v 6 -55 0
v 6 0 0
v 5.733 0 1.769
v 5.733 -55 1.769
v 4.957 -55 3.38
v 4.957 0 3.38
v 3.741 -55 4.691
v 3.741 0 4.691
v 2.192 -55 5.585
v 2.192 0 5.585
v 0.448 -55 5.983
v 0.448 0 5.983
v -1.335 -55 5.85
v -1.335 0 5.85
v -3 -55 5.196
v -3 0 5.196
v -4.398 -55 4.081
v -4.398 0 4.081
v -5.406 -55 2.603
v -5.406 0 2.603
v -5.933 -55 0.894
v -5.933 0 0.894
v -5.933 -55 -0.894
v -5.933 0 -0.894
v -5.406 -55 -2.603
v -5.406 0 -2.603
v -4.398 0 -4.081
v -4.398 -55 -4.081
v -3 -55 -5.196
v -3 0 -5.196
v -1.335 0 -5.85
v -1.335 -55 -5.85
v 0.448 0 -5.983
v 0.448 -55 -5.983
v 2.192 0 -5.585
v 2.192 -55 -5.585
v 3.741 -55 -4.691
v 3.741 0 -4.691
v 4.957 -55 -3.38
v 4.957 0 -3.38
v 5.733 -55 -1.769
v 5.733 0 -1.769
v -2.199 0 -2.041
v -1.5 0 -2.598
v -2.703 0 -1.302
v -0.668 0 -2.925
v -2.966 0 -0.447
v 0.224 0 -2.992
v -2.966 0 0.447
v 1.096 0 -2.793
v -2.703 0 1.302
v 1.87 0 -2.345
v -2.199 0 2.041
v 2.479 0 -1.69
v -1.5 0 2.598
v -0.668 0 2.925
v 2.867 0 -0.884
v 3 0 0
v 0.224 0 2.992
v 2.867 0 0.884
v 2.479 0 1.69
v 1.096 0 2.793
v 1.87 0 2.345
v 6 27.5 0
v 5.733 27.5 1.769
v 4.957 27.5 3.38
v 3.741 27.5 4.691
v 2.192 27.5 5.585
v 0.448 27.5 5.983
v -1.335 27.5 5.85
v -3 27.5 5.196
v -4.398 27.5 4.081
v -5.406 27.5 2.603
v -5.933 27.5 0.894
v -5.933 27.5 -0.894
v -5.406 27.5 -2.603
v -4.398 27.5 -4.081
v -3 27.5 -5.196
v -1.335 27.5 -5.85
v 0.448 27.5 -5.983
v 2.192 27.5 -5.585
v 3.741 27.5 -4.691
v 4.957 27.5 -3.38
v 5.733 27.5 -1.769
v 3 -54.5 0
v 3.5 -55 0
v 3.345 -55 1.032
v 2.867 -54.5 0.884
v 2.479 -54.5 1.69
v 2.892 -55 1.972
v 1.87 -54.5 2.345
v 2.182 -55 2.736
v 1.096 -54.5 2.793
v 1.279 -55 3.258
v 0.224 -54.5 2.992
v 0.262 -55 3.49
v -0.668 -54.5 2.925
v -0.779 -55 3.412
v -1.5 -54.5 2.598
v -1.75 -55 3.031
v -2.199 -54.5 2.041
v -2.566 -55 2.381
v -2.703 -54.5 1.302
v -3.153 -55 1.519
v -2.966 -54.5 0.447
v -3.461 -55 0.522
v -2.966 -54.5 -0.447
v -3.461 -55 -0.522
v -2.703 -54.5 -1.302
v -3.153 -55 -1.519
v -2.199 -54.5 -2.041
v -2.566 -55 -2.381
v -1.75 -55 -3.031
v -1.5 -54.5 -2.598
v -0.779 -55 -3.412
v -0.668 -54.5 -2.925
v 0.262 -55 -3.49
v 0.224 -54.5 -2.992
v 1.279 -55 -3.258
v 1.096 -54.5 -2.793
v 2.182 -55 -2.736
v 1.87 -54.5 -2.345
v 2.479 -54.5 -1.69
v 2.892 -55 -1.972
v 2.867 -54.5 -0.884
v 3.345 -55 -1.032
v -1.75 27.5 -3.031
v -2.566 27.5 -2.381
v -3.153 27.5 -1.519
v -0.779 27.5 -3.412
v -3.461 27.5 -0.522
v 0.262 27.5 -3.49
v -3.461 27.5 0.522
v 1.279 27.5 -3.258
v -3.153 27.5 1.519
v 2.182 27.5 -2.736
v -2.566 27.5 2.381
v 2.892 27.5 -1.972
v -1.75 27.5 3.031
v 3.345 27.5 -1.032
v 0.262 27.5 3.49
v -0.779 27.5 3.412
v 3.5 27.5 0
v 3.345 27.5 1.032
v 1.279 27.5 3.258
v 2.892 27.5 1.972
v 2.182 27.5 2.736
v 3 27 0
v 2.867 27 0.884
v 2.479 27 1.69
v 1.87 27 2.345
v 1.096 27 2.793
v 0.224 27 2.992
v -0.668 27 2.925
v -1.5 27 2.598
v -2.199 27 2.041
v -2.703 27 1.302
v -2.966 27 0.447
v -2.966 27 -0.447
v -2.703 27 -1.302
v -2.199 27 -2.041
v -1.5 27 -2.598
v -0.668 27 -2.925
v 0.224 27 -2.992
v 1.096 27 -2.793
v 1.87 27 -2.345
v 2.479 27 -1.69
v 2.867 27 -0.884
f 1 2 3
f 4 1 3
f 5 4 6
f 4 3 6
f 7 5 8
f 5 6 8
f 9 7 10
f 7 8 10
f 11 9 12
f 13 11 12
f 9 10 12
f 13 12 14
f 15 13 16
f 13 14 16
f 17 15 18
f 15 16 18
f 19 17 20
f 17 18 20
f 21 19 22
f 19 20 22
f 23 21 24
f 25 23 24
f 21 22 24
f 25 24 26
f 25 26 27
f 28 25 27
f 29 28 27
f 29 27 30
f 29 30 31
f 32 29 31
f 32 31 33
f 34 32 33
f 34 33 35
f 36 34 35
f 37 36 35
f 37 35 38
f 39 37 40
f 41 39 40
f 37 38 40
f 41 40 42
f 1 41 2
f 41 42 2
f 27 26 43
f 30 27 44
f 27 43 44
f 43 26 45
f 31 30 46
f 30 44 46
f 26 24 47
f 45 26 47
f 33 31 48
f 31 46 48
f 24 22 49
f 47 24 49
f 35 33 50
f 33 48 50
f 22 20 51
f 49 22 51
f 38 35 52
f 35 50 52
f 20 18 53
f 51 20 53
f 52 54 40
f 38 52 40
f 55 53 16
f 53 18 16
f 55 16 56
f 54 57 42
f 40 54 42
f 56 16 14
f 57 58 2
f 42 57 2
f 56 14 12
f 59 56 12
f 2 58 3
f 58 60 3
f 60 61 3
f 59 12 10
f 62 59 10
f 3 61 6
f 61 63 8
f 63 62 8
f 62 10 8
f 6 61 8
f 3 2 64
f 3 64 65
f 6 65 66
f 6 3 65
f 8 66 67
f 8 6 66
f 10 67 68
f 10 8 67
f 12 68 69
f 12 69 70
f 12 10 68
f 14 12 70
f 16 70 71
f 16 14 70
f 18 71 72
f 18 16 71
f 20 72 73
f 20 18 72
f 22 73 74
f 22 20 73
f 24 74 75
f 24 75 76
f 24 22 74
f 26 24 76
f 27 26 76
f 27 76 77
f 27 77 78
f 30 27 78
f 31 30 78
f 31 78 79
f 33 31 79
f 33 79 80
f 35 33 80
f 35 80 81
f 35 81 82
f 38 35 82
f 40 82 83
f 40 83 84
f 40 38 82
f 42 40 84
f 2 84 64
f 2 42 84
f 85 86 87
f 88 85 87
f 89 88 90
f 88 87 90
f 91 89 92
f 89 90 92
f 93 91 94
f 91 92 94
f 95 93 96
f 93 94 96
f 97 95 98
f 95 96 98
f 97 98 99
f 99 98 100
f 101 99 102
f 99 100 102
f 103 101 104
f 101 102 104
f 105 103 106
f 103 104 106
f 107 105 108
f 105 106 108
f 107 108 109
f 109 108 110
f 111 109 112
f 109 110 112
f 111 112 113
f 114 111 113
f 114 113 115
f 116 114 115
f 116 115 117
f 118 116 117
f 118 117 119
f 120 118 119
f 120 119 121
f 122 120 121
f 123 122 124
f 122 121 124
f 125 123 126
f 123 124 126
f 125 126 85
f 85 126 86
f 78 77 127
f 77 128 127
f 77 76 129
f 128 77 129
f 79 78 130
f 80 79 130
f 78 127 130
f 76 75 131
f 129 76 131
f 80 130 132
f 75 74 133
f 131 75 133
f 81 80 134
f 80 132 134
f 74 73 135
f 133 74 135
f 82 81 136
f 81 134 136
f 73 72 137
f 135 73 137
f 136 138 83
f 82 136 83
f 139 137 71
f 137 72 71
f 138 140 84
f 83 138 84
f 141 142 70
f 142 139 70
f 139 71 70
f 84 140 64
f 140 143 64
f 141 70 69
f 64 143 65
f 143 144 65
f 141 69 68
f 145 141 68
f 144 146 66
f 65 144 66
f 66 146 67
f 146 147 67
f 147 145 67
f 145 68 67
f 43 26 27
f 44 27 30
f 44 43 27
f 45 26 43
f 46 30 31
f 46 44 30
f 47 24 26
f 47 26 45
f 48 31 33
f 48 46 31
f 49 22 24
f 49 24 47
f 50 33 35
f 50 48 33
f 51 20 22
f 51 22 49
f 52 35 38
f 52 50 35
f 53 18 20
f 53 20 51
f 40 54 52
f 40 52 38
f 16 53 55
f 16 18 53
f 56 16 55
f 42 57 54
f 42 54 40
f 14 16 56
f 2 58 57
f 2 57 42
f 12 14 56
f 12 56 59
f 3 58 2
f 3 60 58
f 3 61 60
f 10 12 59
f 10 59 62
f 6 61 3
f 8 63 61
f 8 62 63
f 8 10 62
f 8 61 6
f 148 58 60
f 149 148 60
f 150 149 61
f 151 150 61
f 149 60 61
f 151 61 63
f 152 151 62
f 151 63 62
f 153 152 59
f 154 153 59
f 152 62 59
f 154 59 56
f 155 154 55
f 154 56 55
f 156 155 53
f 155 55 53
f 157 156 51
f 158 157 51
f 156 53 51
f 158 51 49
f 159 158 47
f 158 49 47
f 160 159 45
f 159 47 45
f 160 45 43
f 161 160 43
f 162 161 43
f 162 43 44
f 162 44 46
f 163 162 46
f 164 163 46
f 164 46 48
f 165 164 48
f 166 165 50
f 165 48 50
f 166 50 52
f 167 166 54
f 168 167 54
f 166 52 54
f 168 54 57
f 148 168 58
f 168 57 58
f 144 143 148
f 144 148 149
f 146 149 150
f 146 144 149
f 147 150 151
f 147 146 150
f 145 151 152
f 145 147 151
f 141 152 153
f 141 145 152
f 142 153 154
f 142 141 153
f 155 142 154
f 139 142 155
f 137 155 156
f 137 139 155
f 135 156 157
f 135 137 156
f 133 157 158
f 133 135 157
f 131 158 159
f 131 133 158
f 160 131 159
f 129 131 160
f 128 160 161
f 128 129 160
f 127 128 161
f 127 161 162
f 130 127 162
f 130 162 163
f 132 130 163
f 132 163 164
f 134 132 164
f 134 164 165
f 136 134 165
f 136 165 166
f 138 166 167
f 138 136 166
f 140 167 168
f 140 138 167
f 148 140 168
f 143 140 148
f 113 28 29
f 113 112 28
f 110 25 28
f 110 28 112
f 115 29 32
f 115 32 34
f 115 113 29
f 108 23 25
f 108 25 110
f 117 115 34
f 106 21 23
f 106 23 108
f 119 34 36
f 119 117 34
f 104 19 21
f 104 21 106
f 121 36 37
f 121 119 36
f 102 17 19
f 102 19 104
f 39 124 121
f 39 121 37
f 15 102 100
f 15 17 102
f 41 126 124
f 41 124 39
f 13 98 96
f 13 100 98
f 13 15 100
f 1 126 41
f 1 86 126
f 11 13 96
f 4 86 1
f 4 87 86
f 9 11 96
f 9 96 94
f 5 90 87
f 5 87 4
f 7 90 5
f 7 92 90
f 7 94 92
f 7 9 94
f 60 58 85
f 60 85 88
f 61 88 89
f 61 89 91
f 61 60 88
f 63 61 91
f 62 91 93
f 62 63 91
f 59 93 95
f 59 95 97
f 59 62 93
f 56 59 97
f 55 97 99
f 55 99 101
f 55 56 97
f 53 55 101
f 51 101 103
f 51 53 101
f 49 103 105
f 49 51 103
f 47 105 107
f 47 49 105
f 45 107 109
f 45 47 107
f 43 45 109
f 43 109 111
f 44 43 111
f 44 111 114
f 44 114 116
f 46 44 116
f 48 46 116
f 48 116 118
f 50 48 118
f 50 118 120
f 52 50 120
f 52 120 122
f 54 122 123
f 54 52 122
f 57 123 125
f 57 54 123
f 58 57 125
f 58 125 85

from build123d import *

# Parameters (mm, degrees)
F0_R     = 6
F0_R_2   = 3
F1_DEPTH = 55
F2_SIZE  = 0.5
F3_DEPTH = 27.5
F4_SIZE  = 0.5


with BuildPart() as f1:
    # F0 (on Front) → F1 (new body)
    with BuildSketch(Plane.XZ):
        Circle(F0_R)
        Circle(F0_R_2, mode=Mode.SUBTRACT)
    extrude(amount=F1_DEPTH)

    # F2
    f2_edges = [f1.edges().sort_by_distance(p)[0] for p in [
        (-3, -55, 0),
    ]]
    chamfer(f2_edges, length=F2_SIZE)


with BuildPart() as f3:
    # F0 (on Front) → F3 (new body)
    with BuildSketch(Plane.XZ):
        Circle(F0_R)
        Circle(F0_R_2, mode=Mode.SUBTRACT)
    extrude(amount=-F3_DEPTH)

    # F4
    f4_edges = [f3.edges().sort_by_distance(p)[0] for p in [
        (-3, 27.5, 0),
    ]]
    chamfer(f4_edges, length=F4_SIZE)


solid = Compound([f1.part, f3.part])
